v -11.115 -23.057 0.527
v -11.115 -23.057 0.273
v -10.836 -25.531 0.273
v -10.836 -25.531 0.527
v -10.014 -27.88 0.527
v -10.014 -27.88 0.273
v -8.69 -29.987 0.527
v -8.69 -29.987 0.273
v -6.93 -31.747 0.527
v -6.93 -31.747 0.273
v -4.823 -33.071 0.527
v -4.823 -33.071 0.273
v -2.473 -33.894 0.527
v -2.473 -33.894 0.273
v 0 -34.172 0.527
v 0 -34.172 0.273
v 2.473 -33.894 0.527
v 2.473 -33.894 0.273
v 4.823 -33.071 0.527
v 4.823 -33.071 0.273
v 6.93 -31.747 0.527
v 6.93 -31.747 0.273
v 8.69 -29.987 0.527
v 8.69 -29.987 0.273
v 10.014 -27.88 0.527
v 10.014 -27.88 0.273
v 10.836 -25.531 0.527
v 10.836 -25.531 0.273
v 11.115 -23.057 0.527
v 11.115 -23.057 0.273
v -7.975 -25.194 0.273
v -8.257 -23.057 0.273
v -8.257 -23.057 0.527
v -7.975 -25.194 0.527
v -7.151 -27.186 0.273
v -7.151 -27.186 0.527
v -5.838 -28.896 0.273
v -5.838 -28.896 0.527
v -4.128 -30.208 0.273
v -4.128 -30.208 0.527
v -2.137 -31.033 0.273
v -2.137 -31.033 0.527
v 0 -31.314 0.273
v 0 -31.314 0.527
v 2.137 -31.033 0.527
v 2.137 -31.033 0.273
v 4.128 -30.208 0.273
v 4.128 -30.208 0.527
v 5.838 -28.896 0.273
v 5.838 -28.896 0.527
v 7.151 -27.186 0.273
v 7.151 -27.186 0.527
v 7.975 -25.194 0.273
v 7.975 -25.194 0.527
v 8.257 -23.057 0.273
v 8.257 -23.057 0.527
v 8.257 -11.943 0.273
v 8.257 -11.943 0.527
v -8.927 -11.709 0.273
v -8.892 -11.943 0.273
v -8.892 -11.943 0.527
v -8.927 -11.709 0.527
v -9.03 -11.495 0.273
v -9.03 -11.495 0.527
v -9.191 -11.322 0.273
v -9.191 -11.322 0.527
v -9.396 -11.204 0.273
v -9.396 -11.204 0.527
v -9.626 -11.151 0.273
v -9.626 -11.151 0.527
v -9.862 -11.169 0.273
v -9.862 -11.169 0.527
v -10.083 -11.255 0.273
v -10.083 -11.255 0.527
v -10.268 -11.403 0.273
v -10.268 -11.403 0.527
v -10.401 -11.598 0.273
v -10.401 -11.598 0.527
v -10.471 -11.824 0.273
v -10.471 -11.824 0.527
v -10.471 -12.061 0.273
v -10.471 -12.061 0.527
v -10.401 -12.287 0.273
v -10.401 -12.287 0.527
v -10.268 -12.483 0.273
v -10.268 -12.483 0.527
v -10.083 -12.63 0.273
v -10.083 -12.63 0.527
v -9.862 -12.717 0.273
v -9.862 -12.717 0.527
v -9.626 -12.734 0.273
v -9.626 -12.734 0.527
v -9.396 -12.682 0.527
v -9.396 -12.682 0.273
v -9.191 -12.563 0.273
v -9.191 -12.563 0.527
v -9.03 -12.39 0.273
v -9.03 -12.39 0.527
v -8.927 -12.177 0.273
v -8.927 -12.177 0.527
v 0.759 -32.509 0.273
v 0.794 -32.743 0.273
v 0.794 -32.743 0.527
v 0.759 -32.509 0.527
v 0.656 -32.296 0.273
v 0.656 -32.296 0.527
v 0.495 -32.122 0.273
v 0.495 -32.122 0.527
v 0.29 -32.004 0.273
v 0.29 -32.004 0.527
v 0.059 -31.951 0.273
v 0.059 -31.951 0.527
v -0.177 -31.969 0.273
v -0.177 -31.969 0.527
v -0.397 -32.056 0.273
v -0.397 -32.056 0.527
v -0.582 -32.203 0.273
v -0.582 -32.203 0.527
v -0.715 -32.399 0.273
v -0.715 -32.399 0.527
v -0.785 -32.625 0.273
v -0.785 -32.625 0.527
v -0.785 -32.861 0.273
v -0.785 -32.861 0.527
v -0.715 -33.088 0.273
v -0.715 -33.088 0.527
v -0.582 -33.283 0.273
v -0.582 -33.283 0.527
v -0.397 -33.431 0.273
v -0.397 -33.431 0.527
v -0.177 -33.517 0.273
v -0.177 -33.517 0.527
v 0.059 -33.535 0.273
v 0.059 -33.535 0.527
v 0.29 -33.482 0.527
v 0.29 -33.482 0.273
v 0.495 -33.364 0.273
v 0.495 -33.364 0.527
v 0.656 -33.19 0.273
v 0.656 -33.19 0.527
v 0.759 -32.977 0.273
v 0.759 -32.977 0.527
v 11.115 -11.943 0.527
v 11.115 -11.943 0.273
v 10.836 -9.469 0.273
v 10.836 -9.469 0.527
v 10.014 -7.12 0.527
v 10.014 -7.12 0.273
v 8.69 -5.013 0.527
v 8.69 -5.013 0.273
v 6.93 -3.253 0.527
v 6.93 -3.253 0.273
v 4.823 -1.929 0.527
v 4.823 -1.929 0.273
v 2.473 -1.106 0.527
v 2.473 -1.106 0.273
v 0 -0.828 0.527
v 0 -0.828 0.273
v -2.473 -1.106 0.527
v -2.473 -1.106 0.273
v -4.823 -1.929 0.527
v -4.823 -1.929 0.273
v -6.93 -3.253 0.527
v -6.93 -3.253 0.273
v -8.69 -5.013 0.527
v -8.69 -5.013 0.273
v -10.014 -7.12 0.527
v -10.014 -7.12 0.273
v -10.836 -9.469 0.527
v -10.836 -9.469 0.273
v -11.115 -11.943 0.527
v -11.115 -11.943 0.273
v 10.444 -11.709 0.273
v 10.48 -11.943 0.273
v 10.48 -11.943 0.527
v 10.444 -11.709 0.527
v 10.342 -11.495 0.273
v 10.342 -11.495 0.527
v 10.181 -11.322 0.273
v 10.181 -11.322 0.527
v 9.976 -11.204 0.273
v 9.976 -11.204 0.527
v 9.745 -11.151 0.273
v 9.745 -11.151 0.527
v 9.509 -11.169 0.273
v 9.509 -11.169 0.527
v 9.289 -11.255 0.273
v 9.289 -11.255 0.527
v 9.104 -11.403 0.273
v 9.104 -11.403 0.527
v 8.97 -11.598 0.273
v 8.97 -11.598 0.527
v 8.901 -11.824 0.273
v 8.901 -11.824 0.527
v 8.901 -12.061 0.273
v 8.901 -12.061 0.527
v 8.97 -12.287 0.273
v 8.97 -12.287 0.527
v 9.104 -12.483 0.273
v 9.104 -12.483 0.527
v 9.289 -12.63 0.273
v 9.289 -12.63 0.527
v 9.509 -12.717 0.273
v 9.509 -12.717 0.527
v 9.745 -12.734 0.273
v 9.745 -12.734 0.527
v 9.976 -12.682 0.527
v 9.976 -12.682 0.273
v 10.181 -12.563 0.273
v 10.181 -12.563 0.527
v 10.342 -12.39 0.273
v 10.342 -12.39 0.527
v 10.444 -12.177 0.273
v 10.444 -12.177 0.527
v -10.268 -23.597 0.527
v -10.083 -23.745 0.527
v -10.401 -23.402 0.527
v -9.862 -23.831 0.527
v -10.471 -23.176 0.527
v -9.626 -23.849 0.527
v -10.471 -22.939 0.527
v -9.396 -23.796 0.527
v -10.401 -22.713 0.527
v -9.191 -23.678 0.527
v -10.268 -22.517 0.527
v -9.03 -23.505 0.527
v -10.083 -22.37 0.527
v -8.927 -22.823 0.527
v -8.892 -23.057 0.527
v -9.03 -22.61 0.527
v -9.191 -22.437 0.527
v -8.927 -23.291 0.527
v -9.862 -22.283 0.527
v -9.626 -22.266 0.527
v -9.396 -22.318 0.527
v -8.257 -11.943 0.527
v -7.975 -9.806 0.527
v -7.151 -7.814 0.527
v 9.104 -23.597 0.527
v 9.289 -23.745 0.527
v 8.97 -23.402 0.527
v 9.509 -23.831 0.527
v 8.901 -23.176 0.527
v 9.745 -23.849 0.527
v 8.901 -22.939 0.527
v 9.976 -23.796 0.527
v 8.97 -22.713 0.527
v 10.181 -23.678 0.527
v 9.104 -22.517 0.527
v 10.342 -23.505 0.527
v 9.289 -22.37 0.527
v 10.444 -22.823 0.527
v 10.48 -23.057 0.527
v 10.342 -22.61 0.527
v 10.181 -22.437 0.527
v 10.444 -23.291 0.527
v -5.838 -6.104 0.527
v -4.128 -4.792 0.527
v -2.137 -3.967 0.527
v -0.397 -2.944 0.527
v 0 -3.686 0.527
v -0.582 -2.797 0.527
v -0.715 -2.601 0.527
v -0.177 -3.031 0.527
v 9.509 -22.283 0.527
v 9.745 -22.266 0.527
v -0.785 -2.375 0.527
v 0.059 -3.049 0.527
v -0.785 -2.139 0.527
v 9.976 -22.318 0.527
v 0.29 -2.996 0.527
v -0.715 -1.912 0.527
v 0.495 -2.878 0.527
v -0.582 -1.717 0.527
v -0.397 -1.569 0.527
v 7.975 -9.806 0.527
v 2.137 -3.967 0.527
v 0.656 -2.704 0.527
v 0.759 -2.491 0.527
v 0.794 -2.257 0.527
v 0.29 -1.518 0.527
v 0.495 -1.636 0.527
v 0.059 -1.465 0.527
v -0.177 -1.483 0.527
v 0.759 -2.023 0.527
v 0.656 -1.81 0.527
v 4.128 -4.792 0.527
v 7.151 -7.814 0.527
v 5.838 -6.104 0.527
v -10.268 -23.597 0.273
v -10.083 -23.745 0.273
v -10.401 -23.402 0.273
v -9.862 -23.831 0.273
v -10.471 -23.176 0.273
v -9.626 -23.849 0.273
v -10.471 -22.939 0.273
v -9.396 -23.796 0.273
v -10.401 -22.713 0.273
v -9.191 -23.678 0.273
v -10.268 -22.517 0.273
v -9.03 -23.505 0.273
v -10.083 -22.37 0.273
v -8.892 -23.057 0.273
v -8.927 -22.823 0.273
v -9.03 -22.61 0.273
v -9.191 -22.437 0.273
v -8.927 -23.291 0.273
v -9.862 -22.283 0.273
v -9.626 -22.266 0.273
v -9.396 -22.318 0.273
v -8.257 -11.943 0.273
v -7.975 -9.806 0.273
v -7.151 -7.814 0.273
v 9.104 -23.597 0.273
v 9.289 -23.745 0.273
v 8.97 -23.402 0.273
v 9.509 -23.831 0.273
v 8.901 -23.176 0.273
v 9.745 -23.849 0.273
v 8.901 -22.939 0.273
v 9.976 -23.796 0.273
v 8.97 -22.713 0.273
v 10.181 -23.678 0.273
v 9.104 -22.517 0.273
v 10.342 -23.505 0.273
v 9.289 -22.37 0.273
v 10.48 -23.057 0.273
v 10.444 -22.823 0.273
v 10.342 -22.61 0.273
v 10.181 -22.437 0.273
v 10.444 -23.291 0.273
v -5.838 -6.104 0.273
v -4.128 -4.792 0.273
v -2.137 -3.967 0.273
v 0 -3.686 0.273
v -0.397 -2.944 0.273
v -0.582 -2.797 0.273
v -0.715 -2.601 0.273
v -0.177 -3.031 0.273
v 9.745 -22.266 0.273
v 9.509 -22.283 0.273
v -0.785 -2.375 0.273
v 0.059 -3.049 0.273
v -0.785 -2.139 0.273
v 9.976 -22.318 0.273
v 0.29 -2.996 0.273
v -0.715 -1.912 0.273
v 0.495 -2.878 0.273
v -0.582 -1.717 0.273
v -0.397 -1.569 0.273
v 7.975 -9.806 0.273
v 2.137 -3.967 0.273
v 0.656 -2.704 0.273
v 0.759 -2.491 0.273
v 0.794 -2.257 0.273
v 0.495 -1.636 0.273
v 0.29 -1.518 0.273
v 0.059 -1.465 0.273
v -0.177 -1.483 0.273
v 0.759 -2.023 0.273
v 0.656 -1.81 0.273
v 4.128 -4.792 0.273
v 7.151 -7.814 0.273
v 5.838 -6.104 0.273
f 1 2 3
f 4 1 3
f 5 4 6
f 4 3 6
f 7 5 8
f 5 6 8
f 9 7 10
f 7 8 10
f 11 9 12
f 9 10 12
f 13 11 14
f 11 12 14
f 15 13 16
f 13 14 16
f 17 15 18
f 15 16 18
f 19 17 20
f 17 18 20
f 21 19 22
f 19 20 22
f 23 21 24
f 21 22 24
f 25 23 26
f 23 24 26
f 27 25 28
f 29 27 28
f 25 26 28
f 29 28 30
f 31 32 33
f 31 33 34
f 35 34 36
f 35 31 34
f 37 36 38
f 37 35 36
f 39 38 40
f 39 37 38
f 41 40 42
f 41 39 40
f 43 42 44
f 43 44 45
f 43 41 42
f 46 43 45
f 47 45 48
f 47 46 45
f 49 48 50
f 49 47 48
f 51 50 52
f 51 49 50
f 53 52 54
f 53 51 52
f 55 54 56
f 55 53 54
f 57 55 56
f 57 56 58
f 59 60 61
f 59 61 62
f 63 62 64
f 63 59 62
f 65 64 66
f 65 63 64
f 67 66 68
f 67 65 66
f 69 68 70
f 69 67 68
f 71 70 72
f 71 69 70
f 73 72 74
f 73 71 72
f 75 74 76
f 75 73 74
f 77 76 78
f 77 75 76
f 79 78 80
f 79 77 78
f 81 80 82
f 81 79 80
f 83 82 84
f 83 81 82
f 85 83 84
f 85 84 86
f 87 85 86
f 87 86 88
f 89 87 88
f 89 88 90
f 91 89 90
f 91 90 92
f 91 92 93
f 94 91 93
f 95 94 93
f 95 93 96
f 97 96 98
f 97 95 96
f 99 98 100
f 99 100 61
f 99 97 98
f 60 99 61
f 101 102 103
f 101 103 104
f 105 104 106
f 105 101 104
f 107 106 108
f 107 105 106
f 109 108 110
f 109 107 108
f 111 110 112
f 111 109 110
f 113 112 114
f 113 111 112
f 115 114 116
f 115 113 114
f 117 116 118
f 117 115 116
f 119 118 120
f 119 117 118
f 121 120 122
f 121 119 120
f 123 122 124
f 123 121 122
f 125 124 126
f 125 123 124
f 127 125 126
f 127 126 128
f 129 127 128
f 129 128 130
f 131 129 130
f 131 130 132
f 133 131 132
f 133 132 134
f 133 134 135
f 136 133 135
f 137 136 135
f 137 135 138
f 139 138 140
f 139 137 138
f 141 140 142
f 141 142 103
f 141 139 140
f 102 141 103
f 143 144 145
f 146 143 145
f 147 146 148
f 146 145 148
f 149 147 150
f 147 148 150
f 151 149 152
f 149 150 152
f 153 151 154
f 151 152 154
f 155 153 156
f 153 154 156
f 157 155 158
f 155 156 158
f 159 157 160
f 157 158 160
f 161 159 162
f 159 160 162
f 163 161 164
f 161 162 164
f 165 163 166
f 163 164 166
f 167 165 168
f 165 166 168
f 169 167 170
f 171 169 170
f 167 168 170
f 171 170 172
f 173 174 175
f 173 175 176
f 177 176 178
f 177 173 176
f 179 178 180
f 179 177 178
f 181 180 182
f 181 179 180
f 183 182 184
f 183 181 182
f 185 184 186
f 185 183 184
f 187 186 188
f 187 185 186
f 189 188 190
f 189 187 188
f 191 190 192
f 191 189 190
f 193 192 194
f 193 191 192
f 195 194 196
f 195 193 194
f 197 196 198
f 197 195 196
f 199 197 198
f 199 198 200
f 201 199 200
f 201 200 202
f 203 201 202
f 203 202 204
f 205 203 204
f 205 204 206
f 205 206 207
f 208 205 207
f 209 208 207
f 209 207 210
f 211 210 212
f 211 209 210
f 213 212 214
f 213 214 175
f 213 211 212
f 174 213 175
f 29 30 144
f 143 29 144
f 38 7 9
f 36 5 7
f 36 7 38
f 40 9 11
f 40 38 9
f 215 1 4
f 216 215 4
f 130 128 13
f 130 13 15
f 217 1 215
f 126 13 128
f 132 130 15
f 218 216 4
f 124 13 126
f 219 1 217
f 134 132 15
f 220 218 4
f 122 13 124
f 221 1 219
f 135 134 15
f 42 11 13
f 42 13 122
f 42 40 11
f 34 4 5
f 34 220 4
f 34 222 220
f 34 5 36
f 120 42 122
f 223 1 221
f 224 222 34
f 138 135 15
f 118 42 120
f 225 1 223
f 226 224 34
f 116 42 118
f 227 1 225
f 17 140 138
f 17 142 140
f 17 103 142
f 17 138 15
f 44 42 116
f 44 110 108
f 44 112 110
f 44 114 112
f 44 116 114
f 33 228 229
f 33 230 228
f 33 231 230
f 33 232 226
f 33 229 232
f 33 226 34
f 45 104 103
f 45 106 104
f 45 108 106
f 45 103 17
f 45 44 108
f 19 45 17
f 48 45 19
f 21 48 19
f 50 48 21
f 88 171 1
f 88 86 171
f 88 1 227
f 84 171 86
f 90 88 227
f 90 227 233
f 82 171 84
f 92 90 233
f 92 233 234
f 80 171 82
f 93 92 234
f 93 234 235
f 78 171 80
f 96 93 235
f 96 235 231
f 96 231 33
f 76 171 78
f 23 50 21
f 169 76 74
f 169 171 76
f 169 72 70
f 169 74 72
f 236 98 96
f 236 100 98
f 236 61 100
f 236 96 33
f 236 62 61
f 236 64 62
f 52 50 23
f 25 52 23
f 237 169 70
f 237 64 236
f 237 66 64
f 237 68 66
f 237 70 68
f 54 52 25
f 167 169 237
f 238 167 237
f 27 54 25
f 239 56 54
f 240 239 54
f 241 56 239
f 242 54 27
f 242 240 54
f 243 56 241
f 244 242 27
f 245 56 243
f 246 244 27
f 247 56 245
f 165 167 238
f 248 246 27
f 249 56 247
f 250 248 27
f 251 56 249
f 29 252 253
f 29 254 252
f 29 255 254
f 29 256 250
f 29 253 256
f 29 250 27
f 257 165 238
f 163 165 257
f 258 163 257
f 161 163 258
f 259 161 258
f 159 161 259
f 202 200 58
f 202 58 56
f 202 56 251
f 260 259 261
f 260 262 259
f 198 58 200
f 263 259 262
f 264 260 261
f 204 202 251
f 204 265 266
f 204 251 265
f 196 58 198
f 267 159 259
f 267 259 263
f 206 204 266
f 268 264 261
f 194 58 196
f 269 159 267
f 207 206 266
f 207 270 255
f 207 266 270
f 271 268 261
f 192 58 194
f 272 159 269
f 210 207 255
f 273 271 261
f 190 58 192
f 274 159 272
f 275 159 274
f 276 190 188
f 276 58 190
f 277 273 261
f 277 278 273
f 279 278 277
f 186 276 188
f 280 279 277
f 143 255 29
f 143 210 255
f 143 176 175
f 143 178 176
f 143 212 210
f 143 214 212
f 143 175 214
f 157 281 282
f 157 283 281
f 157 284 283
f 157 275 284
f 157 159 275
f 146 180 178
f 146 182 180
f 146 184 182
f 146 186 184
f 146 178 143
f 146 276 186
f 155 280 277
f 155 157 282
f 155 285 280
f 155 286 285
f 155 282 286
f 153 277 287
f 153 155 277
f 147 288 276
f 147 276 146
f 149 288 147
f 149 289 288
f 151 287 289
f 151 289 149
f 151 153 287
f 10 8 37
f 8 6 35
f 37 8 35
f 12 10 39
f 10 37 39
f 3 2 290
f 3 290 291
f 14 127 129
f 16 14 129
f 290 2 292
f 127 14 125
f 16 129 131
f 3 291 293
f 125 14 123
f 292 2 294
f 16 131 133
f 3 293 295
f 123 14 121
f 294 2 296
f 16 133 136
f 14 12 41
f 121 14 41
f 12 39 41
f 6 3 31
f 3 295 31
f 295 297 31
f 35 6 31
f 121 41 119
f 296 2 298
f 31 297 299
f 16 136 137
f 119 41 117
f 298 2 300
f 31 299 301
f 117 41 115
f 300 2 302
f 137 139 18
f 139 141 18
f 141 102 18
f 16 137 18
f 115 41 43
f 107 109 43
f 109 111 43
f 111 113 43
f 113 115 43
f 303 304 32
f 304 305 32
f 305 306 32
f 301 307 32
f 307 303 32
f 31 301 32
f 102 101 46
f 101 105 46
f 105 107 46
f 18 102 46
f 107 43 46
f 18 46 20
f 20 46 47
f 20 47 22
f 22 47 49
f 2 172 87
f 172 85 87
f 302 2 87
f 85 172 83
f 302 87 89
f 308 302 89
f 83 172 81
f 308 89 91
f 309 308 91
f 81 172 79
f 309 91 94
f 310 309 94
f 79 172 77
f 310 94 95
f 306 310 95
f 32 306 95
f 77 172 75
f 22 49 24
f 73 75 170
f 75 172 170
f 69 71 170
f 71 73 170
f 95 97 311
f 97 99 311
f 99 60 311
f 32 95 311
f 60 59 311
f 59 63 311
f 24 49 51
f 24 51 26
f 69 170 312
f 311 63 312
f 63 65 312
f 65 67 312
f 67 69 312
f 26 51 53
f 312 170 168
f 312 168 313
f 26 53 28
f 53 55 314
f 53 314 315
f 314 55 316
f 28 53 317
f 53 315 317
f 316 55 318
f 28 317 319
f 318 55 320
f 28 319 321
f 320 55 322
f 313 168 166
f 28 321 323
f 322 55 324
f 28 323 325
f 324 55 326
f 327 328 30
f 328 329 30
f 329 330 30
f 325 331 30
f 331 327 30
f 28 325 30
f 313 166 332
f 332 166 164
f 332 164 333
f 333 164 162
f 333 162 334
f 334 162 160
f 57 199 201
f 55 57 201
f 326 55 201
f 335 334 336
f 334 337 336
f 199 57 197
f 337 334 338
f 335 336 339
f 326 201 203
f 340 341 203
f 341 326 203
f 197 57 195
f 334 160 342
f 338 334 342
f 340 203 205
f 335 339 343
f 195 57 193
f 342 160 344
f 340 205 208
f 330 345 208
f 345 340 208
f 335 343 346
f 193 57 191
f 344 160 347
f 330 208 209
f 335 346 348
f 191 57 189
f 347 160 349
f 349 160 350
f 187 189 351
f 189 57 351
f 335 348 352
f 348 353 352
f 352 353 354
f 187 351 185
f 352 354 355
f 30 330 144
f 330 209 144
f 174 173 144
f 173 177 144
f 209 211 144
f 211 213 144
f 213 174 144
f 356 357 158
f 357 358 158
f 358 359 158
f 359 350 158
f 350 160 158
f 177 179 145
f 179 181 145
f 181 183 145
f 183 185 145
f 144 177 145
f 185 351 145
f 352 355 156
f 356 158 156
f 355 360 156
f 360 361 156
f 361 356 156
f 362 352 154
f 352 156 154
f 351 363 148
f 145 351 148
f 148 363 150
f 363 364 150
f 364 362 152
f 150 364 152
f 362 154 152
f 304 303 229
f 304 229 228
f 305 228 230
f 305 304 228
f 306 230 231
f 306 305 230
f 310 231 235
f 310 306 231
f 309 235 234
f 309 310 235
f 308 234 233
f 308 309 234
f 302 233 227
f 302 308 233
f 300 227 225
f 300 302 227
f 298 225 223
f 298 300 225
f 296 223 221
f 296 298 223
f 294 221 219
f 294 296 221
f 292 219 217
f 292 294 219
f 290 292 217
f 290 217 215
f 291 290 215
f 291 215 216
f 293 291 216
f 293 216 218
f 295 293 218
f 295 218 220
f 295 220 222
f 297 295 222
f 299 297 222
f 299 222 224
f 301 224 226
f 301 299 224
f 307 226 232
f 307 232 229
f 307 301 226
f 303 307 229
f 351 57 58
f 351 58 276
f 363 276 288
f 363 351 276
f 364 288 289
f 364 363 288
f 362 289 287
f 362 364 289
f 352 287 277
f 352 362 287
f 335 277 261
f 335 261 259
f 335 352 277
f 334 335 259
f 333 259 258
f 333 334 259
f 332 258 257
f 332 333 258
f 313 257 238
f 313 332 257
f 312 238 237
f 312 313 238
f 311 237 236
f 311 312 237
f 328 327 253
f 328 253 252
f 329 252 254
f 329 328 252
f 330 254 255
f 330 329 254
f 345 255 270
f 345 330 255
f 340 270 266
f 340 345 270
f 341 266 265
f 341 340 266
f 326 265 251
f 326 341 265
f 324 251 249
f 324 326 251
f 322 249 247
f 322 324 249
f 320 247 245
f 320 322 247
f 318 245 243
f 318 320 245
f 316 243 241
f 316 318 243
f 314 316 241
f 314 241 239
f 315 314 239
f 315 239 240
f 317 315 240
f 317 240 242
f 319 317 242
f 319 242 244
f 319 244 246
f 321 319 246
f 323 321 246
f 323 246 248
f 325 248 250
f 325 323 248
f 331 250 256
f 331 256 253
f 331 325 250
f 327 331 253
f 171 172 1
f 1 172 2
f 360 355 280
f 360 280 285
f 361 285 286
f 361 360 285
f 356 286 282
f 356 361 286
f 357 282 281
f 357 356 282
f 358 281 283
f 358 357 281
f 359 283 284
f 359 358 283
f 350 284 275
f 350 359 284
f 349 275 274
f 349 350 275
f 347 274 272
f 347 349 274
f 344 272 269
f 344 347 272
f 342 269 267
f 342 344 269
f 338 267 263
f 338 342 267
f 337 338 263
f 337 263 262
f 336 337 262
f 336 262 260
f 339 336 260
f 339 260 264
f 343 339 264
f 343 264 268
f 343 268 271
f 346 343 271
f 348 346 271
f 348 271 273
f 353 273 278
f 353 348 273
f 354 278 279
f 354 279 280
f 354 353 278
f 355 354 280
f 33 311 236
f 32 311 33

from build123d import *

# Parameters (mm, degrees)
SKETCH1_R           = 2.5
BOSS_EXTRUDE1_DEPTH = 0.8
SCALE1_SCALE        = 0.317565217


with BuildPart() as part:
    # Sketch1 → Boss-Extrude1 (new body)
    with BuildSketch(Plane.XY):
        with BuildLine():
            Line((-35, 0), (-35, -35))
            ThreePointArc((-35, -35), (0, -70), (35, -35))
            Line((35, -35), (35, 0))
            ThreePointArc((35, 0), (0, 35), (-35, 0))
        make_face()
        with Locations((-30.5, 0)):
            Circle(SKETCH1_R, mode=Mode.SUBTRACT)
        with Locations((0, 30.5)):
            Circle(SKETCH1_R, mode=Mode.SUBTRACT)
        with Locations((30.5, 0)):
            Circle(SKETCH1_R, mode=Mode.SUBTRACT)
        with Locations((30.5, -35)):
            Circle(SKETCH1_R, mode=Mode.SUBTRACT)
        with Locations((0, -65.5)):
            Circle(SKETCH1_R, mode=Mode.SUBTRACT)
        with Locations((-30.5, -35)):
            Circle(SKETCH1_R, mode=Mode.SUBTRACT)
        with BuildLine():
            Line((-26, 0), (-26, -35))
            ThreePointArc((-26, -35), (0, -61), (26, -35))
            Line((26, -35), (26, 0))
            ThreePointArc((26, 0), (0, 26), (-26, 0))
        make_face(mode=Mode.SUBTRACT)
    extrude(amount=BOSS_EXTRUDE1_DEPTH)


with BuildPart() as part_1:
    # Scale1: scaled about (0, -17.5, 0.4)
    add(part.part.scale(SCALE1_SCALE).moved(Location((0, -11.942608696, 0.272973913))))


solid = part_1.part
